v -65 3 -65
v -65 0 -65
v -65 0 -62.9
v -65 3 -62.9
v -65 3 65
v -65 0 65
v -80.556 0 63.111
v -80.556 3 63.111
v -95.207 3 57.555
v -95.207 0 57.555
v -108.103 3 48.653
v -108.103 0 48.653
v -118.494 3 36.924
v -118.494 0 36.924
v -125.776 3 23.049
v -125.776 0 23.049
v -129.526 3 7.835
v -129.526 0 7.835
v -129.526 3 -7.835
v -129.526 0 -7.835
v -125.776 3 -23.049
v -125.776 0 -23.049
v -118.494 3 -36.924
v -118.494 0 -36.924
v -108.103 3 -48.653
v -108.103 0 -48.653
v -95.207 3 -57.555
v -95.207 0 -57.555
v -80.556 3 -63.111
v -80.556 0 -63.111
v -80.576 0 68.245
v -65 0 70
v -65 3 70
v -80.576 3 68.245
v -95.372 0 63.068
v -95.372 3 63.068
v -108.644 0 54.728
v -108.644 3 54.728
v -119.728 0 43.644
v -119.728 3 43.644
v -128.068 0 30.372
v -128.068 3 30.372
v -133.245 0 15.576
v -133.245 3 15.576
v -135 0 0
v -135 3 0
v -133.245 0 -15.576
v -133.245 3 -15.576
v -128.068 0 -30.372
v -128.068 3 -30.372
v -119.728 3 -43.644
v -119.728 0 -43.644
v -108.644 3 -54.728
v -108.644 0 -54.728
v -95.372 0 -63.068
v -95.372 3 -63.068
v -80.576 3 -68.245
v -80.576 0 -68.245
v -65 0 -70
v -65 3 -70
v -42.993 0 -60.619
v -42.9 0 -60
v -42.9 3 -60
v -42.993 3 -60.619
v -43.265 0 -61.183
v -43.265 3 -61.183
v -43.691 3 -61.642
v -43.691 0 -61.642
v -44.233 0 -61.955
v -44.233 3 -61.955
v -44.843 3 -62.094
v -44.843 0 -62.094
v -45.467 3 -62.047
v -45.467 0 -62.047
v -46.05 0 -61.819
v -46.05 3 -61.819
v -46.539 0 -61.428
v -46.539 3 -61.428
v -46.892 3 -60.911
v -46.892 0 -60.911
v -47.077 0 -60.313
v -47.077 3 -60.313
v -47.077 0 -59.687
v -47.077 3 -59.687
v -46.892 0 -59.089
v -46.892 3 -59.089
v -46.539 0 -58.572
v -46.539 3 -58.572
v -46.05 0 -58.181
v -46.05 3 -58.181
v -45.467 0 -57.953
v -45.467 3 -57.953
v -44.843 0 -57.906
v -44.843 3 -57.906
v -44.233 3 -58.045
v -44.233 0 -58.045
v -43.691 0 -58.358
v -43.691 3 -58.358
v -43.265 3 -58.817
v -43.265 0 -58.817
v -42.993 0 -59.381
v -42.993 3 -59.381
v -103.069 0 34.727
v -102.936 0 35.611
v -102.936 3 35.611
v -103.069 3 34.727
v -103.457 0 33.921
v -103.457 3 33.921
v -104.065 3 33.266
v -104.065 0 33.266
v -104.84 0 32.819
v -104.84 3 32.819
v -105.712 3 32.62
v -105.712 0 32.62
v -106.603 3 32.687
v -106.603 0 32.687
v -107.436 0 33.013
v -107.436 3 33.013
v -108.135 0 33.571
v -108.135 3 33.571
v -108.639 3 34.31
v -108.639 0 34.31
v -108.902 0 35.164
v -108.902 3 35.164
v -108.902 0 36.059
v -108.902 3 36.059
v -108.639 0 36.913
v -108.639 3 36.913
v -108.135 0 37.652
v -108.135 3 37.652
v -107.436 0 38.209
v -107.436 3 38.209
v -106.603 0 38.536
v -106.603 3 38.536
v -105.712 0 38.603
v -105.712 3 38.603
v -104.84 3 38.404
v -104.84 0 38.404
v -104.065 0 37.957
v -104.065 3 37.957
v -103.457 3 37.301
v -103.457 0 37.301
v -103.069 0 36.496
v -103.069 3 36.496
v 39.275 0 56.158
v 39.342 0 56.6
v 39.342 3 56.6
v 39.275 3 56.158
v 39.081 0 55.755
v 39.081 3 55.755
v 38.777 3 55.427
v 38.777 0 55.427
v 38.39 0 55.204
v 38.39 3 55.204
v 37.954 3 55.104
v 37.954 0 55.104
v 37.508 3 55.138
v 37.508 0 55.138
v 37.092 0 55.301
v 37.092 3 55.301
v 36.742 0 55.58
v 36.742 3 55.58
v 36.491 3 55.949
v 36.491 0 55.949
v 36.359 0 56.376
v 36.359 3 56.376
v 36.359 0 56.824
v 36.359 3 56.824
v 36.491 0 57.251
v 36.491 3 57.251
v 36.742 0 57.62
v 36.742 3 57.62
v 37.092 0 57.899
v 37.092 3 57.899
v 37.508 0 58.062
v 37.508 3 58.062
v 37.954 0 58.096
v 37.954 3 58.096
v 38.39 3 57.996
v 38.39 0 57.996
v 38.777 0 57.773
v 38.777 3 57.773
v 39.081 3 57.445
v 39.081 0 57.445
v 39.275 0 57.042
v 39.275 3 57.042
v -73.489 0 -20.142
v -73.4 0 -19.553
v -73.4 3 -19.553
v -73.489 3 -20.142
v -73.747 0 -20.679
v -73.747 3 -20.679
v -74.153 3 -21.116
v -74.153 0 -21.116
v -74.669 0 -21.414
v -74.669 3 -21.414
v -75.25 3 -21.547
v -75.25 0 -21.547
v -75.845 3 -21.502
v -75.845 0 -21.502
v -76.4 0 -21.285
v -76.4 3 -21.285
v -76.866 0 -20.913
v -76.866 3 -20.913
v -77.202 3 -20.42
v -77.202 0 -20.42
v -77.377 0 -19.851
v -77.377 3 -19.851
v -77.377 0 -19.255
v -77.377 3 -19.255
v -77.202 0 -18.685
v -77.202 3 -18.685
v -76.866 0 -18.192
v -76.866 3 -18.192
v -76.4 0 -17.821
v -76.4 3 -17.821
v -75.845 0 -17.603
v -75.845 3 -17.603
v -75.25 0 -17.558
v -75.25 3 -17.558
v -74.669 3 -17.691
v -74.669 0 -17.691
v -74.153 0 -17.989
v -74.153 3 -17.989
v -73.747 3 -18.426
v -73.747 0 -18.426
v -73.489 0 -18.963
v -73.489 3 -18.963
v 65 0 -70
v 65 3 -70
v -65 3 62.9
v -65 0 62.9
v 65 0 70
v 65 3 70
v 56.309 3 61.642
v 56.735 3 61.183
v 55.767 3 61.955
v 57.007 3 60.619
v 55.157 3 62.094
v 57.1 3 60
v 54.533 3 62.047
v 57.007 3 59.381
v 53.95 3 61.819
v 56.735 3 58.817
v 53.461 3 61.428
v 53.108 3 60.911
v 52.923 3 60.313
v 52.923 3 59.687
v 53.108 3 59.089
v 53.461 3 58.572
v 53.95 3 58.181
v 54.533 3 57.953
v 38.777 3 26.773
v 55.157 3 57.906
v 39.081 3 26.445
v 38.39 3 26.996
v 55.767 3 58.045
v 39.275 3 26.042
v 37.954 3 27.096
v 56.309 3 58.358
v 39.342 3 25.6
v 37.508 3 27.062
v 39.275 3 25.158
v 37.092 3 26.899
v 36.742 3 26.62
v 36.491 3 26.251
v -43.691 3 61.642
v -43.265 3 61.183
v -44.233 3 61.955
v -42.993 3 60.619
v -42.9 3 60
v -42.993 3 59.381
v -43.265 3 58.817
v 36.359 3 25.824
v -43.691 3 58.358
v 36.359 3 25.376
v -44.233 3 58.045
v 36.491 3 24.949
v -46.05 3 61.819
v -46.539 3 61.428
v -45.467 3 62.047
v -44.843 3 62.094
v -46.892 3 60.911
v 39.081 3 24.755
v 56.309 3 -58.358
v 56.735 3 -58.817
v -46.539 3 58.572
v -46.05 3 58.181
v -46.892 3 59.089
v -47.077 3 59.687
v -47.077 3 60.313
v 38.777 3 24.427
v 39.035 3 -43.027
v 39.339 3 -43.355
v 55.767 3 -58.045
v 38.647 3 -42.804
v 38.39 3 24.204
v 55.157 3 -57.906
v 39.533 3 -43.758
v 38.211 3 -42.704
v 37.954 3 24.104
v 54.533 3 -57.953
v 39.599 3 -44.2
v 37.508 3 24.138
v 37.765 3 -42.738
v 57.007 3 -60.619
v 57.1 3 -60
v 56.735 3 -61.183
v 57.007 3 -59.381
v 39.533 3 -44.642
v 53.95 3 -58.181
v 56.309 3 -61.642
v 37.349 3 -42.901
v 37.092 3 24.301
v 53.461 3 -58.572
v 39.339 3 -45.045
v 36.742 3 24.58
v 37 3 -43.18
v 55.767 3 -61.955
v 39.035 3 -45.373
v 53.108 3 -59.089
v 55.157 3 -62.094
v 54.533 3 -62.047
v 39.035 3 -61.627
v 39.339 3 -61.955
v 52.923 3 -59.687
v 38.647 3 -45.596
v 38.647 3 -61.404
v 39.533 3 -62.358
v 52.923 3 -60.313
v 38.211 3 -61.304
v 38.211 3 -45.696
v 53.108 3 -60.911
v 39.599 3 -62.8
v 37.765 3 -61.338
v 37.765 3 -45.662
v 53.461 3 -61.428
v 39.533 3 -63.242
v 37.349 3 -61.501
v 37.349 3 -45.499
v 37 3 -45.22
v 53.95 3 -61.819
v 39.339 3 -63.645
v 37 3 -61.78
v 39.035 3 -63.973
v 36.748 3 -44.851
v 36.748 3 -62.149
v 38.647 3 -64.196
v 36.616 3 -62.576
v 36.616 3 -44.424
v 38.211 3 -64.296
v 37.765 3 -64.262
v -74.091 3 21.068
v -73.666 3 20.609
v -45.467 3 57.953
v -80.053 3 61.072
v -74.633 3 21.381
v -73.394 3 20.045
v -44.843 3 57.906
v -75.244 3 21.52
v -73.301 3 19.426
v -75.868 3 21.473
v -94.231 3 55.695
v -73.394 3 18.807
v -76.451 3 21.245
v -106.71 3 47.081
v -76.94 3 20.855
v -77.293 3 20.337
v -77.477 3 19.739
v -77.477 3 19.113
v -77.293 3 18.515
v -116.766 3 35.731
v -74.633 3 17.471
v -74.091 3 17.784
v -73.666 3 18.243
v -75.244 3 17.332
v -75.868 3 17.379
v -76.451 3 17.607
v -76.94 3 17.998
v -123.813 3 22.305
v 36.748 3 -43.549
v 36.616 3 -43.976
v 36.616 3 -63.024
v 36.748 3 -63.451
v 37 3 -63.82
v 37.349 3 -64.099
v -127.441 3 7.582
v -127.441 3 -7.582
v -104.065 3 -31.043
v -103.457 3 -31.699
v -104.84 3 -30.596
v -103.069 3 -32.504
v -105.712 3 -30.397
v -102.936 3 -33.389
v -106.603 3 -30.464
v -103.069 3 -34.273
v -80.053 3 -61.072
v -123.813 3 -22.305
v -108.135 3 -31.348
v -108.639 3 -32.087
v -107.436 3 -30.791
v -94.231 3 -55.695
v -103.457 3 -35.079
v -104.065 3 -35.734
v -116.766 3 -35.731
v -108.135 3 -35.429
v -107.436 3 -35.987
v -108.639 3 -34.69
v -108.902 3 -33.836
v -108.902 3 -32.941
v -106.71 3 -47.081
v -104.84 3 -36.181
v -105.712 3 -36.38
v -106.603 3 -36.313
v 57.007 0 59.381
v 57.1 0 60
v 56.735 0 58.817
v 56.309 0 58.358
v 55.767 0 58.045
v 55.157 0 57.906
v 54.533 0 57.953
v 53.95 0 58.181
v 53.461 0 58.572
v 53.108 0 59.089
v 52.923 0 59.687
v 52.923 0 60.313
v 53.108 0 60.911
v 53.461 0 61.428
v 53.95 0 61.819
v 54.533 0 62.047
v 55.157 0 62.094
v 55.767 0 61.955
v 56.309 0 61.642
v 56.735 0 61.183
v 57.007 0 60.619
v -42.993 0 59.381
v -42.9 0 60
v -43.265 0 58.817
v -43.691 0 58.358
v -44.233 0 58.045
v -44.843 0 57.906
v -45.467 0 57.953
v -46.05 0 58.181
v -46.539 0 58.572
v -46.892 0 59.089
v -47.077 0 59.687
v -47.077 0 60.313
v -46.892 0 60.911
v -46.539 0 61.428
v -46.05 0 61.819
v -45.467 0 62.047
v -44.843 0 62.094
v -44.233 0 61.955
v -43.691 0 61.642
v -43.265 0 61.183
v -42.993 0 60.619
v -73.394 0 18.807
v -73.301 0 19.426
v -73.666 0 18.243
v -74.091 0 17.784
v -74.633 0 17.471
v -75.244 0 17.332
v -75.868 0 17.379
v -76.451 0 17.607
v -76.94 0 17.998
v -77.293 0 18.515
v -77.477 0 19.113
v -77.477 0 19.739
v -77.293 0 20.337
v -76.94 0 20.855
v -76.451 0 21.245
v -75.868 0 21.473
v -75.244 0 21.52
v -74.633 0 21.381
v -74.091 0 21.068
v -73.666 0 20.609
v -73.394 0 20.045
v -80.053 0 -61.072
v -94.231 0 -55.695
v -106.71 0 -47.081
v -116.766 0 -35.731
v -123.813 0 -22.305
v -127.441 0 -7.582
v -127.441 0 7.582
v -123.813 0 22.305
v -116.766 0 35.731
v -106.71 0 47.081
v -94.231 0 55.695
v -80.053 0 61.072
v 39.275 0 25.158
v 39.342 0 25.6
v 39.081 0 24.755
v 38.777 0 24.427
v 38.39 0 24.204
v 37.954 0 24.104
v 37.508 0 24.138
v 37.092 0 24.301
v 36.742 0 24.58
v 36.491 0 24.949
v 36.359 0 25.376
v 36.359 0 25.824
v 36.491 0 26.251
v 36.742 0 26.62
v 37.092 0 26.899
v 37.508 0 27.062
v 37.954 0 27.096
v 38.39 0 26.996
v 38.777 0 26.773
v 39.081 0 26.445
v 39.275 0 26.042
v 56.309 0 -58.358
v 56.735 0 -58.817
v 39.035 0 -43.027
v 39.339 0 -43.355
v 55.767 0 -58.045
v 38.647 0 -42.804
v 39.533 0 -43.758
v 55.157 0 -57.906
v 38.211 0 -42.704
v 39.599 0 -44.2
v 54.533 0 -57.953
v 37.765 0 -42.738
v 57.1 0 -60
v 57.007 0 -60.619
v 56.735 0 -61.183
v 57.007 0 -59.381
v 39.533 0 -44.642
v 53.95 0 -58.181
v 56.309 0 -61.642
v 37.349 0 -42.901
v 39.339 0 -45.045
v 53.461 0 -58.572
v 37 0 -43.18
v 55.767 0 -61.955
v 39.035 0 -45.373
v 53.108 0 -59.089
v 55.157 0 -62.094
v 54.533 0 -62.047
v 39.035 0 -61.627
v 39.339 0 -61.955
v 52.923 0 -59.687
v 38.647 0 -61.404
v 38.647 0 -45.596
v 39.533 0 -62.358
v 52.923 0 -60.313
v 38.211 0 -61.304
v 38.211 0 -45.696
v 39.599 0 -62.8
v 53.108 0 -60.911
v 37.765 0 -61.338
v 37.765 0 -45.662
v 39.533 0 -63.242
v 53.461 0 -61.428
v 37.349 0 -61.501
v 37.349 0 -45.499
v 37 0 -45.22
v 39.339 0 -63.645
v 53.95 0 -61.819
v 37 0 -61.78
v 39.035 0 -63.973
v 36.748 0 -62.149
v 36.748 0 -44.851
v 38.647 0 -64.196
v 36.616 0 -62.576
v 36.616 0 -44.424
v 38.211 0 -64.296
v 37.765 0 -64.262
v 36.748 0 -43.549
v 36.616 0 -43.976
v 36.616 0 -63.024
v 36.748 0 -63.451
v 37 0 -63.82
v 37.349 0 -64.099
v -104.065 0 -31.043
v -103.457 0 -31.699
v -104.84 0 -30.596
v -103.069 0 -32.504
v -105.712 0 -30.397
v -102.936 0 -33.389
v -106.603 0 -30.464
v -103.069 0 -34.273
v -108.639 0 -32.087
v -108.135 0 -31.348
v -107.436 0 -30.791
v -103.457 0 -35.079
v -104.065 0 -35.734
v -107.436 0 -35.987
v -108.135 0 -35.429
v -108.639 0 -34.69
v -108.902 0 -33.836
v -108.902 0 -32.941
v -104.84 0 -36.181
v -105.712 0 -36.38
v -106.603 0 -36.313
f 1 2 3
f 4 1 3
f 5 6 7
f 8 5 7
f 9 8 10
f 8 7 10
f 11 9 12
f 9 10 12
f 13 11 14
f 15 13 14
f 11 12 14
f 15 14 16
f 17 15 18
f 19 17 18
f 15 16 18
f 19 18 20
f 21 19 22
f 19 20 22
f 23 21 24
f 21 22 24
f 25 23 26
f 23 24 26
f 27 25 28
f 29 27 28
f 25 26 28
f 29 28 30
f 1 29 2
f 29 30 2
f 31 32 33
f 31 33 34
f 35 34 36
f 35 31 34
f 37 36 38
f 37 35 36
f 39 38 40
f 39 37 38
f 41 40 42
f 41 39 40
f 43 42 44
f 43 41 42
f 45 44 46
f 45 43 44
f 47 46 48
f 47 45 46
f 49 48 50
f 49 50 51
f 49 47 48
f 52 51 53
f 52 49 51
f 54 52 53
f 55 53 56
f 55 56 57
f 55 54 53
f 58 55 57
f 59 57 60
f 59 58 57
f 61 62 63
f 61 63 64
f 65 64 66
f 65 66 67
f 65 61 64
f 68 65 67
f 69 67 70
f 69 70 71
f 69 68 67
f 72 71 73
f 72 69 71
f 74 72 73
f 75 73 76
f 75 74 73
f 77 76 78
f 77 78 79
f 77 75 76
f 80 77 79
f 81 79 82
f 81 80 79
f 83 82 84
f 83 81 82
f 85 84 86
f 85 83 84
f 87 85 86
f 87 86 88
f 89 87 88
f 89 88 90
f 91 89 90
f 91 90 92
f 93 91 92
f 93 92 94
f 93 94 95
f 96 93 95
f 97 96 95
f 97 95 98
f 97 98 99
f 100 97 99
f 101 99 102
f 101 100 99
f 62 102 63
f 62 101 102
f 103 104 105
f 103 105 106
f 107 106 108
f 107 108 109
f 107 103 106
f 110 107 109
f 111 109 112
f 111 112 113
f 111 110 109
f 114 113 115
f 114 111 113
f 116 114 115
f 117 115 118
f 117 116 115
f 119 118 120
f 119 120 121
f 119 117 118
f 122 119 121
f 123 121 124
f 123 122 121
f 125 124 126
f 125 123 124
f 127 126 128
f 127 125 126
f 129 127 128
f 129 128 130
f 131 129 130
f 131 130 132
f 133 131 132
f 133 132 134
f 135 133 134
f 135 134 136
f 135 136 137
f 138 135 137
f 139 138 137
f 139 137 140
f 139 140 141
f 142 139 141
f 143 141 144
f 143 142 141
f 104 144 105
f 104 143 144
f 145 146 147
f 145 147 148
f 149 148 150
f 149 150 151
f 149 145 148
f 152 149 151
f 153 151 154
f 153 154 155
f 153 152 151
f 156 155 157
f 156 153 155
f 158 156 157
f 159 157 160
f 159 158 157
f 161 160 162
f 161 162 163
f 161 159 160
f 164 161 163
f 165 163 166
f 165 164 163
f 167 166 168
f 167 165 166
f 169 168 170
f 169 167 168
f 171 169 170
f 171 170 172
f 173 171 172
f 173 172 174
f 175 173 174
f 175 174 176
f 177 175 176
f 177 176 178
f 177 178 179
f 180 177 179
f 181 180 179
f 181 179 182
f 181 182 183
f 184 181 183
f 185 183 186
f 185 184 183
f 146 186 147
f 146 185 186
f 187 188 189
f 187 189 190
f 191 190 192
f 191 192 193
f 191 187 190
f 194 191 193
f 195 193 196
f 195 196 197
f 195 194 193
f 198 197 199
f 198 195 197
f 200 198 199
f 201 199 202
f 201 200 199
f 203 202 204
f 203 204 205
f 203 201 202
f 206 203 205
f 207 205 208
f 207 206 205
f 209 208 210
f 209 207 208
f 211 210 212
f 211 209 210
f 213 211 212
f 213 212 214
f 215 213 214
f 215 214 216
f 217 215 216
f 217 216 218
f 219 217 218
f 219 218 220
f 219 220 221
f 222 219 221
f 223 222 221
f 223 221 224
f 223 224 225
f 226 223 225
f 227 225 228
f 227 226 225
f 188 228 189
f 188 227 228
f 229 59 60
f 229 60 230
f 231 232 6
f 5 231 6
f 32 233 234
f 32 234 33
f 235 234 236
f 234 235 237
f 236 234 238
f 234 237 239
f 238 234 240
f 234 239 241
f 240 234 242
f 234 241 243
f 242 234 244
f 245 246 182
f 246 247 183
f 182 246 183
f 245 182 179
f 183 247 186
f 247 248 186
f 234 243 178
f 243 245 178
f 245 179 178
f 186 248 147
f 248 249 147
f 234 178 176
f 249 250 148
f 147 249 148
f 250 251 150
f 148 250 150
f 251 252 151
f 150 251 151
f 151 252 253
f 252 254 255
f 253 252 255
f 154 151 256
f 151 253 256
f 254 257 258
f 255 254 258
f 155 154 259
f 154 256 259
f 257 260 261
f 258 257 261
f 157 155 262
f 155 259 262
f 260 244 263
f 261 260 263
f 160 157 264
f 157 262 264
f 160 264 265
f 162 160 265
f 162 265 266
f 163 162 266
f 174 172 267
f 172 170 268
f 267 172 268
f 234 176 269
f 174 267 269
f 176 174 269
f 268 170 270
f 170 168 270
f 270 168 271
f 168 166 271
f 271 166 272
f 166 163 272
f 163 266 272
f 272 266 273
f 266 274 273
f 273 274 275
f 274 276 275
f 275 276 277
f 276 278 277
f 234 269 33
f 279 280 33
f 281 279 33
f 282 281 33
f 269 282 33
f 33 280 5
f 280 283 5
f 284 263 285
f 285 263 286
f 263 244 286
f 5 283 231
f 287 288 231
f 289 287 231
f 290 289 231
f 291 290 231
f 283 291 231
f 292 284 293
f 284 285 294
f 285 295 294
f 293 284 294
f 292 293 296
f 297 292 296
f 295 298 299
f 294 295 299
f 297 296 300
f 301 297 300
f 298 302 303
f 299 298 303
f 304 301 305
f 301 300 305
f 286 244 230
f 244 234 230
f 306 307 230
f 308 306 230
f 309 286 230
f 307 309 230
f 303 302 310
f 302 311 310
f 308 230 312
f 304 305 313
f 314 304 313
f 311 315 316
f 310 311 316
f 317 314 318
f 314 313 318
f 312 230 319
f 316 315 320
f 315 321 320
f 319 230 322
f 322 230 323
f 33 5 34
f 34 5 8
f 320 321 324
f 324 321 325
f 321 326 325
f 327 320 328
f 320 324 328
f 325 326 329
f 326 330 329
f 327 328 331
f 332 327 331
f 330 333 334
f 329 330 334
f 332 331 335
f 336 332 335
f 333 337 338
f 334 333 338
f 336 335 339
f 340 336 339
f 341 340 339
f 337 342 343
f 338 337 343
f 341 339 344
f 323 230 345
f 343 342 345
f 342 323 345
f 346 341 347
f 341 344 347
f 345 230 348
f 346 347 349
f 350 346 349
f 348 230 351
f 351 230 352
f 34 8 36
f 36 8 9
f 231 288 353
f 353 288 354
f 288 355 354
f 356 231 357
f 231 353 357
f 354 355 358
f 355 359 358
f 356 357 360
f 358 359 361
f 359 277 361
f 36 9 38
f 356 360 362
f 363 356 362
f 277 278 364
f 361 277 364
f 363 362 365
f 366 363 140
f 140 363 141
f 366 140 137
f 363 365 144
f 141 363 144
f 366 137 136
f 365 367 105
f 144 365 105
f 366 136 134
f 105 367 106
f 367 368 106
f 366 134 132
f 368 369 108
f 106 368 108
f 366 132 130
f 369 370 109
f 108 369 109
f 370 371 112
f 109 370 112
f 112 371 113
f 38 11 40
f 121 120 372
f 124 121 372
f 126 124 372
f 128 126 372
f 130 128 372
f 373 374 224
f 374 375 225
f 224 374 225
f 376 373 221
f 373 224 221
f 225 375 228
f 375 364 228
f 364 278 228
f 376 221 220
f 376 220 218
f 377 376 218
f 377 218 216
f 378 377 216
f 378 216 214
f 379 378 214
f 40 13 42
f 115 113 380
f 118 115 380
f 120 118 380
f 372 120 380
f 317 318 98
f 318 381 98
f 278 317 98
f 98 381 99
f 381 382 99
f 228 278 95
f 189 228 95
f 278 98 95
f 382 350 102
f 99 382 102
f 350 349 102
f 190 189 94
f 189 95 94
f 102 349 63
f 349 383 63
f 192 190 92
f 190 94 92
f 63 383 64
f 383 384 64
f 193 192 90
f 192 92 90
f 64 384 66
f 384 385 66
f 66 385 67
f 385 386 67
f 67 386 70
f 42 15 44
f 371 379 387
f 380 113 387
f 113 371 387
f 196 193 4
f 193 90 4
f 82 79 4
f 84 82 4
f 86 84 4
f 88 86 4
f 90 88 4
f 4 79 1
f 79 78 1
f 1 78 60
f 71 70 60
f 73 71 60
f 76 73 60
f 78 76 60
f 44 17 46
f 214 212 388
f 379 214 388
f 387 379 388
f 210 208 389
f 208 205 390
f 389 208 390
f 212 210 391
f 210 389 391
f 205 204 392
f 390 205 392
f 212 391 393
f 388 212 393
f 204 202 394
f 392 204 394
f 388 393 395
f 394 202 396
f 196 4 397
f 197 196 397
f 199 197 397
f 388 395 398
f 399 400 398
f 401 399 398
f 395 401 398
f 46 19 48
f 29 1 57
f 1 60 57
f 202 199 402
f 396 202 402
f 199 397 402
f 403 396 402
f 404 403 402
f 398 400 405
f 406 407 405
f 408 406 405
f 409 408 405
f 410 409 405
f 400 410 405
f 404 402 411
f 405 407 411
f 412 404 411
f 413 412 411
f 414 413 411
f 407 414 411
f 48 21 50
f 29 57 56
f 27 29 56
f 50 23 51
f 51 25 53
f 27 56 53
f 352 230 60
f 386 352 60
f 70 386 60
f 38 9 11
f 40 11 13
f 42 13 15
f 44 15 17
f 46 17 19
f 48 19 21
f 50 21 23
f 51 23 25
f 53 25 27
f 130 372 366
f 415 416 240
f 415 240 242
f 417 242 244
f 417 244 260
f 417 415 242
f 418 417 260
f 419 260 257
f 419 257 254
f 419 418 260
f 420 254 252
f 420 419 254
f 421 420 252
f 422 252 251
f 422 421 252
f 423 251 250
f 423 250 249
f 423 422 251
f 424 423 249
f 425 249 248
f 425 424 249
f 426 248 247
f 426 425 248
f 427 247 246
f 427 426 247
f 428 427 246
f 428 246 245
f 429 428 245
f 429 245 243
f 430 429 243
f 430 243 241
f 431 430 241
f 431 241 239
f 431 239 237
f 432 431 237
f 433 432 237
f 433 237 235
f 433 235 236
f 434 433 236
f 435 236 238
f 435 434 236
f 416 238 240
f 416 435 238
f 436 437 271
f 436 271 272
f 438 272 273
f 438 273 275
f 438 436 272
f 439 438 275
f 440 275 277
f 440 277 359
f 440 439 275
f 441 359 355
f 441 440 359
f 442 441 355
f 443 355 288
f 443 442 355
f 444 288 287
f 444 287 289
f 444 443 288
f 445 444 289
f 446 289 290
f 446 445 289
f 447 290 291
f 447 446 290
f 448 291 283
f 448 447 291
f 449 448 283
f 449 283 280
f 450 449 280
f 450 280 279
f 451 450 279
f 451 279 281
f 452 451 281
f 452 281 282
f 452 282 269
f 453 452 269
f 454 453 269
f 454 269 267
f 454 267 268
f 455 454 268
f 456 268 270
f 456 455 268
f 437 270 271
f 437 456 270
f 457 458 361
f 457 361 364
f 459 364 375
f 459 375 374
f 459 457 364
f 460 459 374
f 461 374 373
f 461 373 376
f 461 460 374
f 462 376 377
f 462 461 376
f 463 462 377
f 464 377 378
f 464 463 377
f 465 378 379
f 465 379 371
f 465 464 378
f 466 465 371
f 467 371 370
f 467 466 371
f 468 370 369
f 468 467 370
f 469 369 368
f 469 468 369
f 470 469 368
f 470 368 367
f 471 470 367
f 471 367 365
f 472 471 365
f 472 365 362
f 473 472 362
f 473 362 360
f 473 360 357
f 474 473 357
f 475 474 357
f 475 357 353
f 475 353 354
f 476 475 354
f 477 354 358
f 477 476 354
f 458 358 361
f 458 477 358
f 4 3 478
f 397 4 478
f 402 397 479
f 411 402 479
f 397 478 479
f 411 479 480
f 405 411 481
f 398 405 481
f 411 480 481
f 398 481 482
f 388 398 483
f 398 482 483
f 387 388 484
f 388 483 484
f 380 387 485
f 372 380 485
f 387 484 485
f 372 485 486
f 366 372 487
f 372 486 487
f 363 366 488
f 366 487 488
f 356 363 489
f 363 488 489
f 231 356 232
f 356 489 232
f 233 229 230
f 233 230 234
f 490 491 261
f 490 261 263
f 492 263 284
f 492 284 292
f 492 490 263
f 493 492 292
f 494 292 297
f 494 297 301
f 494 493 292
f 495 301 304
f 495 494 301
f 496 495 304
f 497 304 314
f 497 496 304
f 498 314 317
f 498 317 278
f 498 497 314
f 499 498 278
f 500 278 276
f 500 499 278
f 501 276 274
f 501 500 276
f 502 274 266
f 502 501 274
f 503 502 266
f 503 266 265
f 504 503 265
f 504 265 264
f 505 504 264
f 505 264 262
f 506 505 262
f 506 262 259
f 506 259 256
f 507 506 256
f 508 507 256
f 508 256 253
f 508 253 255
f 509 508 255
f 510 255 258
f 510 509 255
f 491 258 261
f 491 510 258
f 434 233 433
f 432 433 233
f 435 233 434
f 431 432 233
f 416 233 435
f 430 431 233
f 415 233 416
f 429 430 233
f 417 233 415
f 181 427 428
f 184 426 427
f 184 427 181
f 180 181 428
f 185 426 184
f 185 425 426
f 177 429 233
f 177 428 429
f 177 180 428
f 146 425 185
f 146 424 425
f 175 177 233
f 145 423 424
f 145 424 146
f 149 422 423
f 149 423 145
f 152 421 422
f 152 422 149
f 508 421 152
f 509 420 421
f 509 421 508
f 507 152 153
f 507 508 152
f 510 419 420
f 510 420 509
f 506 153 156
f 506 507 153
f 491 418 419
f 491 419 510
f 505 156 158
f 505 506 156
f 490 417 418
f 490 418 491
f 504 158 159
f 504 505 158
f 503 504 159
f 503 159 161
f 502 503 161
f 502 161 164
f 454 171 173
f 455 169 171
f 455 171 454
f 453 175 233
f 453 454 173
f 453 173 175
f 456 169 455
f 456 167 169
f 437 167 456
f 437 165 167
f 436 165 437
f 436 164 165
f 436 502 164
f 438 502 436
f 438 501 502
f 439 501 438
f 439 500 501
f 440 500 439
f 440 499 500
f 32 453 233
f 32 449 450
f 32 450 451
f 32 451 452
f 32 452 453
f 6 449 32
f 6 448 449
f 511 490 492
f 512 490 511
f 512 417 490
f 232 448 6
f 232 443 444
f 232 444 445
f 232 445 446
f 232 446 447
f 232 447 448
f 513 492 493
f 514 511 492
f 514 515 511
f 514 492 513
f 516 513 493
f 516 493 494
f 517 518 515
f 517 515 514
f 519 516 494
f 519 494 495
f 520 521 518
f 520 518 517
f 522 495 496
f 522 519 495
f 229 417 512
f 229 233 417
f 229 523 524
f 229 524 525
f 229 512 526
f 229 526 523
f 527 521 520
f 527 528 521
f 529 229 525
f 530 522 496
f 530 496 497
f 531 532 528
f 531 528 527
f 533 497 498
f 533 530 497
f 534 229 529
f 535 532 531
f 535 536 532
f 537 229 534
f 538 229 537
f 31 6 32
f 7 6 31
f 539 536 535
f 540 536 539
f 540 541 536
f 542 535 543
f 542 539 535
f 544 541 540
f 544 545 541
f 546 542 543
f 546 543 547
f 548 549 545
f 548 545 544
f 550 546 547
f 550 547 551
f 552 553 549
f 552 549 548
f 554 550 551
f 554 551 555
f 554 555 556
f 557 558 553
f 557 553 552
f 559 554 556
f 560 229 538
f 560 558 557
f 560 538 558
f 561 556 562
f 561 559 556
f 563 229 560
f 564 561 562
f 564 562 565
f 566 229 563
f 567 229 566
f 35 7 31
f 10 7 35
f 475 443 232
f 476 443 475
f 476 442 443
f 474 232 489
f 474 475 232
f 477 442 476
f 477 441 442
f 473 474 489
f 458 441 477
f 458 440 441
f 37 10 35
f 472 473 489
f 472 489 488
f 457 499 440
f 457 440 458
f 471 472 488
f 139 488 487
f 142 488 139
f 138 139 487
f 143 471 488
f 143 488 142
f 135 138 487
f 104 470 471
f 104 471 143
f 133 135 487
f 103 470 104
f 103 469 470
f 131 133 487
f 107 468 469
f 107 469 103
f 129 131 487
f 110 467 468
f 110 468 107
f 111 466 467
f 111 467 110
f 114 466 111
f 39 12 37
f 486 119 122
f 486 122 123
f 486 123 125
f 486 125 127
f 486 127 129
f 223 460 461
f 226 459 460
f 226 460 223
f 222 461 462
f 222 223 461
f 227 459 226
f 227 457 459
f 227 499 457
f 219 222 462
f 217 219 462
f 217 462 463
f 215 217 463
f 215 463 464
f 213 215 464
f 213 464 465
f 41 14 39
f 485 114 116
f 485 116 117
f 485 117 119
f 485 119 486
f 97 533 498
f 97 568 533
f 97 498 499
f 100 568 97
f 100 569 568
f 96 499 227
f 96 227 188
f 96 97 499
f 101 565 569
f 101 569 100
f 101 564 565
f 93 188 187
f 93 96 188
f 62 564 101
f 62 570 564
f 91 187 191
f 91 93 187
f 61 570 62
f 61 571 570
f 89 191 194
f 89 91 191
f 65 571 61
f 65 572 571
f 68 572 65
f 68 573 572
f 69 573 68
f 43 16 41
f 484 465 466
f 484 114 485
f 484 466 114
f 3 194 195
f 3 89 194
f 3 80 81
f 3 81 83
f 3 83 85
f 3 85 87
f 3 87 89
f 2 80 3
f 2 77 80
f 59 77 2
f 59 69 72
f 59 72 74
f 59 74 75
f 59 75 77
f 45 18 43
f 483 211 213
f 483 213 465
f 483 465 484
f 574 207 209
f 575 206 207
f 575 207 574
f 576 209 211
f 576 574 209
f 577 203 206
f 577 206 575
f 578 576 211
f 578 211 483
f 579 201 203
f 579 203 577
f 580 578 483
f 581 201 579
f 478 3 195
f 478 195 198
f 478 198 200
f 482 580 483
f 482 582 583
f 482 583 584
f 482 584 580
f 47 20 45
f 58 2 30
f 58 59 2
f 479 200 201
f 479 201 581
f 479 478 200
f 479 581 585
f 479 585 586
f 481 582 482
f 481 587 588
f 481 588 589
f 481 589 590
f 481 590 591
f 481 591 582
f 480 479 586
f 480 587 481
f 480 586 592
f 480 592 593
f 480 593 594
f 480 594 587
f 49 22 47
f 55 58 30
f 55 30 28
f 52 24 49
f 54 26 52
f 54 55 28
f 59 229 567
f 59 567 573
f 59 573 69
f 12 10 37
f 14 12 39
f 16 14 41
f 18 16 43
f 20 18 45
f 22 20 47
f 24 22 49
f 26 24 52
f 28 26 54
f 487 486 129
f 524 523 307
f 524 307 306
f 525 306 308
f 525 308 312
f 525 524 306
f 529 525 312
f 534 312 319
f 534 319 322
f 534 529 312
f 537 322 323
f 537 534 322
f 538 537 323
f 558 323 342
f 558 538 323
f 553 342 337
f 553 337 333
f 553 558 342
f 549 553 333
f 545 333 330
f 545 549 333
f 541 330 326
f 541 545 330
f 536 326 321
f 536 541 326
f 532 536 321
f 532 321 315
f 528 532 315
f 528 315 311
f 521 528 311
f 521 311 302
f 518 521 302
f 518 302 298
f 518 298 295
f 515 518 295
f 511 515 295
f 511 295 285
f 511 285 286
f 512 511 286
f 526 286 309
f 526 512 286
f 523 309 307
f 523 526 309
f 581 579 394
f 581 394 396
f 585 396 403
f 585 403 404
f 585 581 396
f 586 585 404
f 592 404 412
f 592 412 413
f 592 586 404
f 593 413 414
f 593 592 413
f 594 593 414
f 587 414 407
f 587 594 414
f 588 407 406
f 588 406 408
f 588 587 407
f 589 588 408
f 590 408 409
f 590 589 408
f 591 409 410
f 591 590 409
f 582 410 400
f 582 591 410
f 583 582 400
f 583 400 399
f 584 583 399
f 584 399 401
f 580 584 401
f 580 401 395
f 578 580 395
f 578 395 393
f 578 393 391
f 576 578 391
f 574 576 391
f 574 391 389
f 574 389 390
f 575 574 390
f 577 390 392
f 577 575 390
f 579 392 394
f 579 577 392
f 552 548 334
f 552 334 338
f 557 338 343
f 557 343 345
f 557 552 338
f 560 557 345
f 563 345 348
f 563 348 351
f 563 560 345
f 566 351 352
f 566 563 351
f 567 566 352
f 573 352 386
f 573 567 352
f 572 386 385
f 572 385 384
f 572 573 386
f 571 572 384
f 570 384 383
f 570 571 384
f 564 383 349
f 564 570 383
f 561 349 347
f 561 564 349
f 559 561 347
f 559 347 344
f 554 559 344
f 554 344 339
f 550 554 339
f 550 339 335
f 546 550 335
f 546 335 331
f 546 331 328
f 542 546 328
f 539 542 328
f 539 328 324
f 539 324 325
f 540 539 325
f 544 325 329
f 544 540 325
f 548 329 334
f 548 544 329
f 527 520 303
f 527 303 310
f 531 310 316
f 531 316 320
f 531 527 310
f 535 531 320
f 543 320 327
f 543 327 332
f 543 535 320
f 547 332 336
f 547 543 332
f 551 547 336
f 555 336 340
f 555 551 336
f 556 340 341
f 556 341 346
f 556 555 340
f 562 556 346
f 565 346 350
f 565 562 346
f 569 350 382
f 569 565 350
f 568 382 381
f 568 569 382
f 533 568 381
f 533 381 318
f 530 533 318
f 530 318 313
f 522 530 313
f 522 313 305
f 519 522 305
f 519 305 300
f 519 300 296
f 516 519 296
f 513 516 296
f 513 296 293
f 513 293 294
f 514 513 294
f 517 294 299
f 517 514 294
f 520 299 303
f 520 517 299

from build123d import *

# Parameters (mm, degrees)
SKETCH1_R           = 2.1
SKETCH1_R_2         = 1.5
SKETCH1_R_3         = 2
SKETCH1_R_4         = 3
BOSS_EXTRUDE1_DEPTH = 3


with BuildPart() as part:
    # Sketch1 → Boss-Extrude1 (new body)
    with BuildSketch(Plane(origin=(0, 0, 0), x_dir=(1, 0, 0), z_dir=(0, 1, 0))):
        with BuildLine():
            Line((65, -70), (-65, -70))
            ThreePointArc((-65, -70), (-135, 0), (-65, 70))
            Line((-65, 70), (65, 70))
            Line((65, 70), (65, -70))
        make_face()
        with Locations((-45, -60)):
            Circle(SKETCH1_R, mode=Mode.SUBTRACT)
        with Locations((-45, 60)):
            Circle(SKETCH1_R, mode=Mode.SUBTRACT)
        with Locations((55, -60)):
            Circle(SKETCH1_R, mode=Mode.SUBTRACT)
        with Locations((55, 60)):
            Circle(SKETCH1_R, mode=Mode.SUBTRACT)
        with Locations((37.841964001, -25.6)):
            Circle(SKETCH1_R_2, mode=Mode.SUBTRACT)
        with Locations((37.841964001, -56.6)):
            Circle(SKETCH1_R_2, mode=Mode.SUBTRACT)
        with Locations((38.099271459, 44.2)):
            Circle(SKETCH1_R_2, mode=Mode.SUBTRACT)
        with Locations((38.099271459, 62.8)):
            Circle(SKETCH1_R_2, mode=Mode.SUBTRACT)
        with Locations((-75.400632029, -19.426149967)):
            Circle(SKETCH1_R, mode=Mode.SUBTRACT)
        with Locations((-75.399684811, 19.552626294)):
            Circle(SKETCH1_R_3, mode=Mode.SUBTRACT)
        with Locations((-105.935731265, 33.388623858)):
            Circle(SKETCH1_R_4, mode=Mode.SUBTRACT)
        with Locations((-105.935731265, -35.611376142)):
            Circle(SKETCH1_R_4, mode=Mode.SUBTRACT)
        with BuildLine():
            Line((-65, 65), (-65, 62.9))
            ThreePointArc((-65, 62.9), (-127.9, 0), (-65, -62.9))
            Line((-65, -62.9), (-65, -65))
            ThreePointArc((-65, -65), (-130, 0), (-65, 65))
        make_face(mode=Mode.SUBTRACT)
    extrude(amount=BOSS_EXTRUDE1_DEPTH)


solid = part.part
